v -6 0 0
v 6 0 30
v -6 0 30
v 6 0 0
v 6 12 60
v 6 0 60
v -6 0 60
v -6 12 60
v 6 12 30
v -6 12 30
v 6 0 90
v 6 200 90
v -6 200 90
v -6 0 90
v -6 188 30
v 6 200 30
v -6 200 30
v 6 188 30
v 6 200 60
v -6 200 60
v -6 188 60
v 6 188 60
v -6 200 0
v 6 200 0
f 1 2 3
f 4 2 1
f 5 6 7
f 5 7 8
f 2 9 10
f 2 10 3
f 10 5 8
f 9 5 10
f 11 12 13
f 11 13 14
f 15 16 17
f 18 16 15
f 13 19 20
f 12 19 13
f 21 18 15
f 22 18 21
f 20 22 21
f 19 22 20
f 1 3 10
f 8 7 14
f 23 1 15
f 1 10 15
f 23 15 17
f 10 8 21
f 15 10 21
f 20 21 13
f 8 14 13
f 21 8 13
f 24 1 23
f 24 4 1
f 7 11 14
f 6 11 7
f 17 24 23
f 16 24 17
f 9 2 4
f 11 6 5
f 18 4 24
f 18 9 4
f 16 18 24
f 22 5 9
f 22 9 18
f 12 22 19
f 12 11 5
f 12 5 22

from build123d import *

# Parameters (mm, degrees)
F1_DEPTH = 6


with BuildPart() as f1:
    # F0 (on Right) → F1 (new body, symmetric)
    with BuildSketch(Plane.YZ):
        Polygon((100, 90), (100, 0), (200, 0), (200, 30), (188, 30), (188, 60), (200, 60), (200, 90), align=None)
        Polygon((0, 30), (0, 0), (100, 0), (100, 90), (0, 90), (0, 60), (12, 60), (12, 30), align=None)
    extrude(amount=F1_DEPTH, both=True)


solid = f1.part
